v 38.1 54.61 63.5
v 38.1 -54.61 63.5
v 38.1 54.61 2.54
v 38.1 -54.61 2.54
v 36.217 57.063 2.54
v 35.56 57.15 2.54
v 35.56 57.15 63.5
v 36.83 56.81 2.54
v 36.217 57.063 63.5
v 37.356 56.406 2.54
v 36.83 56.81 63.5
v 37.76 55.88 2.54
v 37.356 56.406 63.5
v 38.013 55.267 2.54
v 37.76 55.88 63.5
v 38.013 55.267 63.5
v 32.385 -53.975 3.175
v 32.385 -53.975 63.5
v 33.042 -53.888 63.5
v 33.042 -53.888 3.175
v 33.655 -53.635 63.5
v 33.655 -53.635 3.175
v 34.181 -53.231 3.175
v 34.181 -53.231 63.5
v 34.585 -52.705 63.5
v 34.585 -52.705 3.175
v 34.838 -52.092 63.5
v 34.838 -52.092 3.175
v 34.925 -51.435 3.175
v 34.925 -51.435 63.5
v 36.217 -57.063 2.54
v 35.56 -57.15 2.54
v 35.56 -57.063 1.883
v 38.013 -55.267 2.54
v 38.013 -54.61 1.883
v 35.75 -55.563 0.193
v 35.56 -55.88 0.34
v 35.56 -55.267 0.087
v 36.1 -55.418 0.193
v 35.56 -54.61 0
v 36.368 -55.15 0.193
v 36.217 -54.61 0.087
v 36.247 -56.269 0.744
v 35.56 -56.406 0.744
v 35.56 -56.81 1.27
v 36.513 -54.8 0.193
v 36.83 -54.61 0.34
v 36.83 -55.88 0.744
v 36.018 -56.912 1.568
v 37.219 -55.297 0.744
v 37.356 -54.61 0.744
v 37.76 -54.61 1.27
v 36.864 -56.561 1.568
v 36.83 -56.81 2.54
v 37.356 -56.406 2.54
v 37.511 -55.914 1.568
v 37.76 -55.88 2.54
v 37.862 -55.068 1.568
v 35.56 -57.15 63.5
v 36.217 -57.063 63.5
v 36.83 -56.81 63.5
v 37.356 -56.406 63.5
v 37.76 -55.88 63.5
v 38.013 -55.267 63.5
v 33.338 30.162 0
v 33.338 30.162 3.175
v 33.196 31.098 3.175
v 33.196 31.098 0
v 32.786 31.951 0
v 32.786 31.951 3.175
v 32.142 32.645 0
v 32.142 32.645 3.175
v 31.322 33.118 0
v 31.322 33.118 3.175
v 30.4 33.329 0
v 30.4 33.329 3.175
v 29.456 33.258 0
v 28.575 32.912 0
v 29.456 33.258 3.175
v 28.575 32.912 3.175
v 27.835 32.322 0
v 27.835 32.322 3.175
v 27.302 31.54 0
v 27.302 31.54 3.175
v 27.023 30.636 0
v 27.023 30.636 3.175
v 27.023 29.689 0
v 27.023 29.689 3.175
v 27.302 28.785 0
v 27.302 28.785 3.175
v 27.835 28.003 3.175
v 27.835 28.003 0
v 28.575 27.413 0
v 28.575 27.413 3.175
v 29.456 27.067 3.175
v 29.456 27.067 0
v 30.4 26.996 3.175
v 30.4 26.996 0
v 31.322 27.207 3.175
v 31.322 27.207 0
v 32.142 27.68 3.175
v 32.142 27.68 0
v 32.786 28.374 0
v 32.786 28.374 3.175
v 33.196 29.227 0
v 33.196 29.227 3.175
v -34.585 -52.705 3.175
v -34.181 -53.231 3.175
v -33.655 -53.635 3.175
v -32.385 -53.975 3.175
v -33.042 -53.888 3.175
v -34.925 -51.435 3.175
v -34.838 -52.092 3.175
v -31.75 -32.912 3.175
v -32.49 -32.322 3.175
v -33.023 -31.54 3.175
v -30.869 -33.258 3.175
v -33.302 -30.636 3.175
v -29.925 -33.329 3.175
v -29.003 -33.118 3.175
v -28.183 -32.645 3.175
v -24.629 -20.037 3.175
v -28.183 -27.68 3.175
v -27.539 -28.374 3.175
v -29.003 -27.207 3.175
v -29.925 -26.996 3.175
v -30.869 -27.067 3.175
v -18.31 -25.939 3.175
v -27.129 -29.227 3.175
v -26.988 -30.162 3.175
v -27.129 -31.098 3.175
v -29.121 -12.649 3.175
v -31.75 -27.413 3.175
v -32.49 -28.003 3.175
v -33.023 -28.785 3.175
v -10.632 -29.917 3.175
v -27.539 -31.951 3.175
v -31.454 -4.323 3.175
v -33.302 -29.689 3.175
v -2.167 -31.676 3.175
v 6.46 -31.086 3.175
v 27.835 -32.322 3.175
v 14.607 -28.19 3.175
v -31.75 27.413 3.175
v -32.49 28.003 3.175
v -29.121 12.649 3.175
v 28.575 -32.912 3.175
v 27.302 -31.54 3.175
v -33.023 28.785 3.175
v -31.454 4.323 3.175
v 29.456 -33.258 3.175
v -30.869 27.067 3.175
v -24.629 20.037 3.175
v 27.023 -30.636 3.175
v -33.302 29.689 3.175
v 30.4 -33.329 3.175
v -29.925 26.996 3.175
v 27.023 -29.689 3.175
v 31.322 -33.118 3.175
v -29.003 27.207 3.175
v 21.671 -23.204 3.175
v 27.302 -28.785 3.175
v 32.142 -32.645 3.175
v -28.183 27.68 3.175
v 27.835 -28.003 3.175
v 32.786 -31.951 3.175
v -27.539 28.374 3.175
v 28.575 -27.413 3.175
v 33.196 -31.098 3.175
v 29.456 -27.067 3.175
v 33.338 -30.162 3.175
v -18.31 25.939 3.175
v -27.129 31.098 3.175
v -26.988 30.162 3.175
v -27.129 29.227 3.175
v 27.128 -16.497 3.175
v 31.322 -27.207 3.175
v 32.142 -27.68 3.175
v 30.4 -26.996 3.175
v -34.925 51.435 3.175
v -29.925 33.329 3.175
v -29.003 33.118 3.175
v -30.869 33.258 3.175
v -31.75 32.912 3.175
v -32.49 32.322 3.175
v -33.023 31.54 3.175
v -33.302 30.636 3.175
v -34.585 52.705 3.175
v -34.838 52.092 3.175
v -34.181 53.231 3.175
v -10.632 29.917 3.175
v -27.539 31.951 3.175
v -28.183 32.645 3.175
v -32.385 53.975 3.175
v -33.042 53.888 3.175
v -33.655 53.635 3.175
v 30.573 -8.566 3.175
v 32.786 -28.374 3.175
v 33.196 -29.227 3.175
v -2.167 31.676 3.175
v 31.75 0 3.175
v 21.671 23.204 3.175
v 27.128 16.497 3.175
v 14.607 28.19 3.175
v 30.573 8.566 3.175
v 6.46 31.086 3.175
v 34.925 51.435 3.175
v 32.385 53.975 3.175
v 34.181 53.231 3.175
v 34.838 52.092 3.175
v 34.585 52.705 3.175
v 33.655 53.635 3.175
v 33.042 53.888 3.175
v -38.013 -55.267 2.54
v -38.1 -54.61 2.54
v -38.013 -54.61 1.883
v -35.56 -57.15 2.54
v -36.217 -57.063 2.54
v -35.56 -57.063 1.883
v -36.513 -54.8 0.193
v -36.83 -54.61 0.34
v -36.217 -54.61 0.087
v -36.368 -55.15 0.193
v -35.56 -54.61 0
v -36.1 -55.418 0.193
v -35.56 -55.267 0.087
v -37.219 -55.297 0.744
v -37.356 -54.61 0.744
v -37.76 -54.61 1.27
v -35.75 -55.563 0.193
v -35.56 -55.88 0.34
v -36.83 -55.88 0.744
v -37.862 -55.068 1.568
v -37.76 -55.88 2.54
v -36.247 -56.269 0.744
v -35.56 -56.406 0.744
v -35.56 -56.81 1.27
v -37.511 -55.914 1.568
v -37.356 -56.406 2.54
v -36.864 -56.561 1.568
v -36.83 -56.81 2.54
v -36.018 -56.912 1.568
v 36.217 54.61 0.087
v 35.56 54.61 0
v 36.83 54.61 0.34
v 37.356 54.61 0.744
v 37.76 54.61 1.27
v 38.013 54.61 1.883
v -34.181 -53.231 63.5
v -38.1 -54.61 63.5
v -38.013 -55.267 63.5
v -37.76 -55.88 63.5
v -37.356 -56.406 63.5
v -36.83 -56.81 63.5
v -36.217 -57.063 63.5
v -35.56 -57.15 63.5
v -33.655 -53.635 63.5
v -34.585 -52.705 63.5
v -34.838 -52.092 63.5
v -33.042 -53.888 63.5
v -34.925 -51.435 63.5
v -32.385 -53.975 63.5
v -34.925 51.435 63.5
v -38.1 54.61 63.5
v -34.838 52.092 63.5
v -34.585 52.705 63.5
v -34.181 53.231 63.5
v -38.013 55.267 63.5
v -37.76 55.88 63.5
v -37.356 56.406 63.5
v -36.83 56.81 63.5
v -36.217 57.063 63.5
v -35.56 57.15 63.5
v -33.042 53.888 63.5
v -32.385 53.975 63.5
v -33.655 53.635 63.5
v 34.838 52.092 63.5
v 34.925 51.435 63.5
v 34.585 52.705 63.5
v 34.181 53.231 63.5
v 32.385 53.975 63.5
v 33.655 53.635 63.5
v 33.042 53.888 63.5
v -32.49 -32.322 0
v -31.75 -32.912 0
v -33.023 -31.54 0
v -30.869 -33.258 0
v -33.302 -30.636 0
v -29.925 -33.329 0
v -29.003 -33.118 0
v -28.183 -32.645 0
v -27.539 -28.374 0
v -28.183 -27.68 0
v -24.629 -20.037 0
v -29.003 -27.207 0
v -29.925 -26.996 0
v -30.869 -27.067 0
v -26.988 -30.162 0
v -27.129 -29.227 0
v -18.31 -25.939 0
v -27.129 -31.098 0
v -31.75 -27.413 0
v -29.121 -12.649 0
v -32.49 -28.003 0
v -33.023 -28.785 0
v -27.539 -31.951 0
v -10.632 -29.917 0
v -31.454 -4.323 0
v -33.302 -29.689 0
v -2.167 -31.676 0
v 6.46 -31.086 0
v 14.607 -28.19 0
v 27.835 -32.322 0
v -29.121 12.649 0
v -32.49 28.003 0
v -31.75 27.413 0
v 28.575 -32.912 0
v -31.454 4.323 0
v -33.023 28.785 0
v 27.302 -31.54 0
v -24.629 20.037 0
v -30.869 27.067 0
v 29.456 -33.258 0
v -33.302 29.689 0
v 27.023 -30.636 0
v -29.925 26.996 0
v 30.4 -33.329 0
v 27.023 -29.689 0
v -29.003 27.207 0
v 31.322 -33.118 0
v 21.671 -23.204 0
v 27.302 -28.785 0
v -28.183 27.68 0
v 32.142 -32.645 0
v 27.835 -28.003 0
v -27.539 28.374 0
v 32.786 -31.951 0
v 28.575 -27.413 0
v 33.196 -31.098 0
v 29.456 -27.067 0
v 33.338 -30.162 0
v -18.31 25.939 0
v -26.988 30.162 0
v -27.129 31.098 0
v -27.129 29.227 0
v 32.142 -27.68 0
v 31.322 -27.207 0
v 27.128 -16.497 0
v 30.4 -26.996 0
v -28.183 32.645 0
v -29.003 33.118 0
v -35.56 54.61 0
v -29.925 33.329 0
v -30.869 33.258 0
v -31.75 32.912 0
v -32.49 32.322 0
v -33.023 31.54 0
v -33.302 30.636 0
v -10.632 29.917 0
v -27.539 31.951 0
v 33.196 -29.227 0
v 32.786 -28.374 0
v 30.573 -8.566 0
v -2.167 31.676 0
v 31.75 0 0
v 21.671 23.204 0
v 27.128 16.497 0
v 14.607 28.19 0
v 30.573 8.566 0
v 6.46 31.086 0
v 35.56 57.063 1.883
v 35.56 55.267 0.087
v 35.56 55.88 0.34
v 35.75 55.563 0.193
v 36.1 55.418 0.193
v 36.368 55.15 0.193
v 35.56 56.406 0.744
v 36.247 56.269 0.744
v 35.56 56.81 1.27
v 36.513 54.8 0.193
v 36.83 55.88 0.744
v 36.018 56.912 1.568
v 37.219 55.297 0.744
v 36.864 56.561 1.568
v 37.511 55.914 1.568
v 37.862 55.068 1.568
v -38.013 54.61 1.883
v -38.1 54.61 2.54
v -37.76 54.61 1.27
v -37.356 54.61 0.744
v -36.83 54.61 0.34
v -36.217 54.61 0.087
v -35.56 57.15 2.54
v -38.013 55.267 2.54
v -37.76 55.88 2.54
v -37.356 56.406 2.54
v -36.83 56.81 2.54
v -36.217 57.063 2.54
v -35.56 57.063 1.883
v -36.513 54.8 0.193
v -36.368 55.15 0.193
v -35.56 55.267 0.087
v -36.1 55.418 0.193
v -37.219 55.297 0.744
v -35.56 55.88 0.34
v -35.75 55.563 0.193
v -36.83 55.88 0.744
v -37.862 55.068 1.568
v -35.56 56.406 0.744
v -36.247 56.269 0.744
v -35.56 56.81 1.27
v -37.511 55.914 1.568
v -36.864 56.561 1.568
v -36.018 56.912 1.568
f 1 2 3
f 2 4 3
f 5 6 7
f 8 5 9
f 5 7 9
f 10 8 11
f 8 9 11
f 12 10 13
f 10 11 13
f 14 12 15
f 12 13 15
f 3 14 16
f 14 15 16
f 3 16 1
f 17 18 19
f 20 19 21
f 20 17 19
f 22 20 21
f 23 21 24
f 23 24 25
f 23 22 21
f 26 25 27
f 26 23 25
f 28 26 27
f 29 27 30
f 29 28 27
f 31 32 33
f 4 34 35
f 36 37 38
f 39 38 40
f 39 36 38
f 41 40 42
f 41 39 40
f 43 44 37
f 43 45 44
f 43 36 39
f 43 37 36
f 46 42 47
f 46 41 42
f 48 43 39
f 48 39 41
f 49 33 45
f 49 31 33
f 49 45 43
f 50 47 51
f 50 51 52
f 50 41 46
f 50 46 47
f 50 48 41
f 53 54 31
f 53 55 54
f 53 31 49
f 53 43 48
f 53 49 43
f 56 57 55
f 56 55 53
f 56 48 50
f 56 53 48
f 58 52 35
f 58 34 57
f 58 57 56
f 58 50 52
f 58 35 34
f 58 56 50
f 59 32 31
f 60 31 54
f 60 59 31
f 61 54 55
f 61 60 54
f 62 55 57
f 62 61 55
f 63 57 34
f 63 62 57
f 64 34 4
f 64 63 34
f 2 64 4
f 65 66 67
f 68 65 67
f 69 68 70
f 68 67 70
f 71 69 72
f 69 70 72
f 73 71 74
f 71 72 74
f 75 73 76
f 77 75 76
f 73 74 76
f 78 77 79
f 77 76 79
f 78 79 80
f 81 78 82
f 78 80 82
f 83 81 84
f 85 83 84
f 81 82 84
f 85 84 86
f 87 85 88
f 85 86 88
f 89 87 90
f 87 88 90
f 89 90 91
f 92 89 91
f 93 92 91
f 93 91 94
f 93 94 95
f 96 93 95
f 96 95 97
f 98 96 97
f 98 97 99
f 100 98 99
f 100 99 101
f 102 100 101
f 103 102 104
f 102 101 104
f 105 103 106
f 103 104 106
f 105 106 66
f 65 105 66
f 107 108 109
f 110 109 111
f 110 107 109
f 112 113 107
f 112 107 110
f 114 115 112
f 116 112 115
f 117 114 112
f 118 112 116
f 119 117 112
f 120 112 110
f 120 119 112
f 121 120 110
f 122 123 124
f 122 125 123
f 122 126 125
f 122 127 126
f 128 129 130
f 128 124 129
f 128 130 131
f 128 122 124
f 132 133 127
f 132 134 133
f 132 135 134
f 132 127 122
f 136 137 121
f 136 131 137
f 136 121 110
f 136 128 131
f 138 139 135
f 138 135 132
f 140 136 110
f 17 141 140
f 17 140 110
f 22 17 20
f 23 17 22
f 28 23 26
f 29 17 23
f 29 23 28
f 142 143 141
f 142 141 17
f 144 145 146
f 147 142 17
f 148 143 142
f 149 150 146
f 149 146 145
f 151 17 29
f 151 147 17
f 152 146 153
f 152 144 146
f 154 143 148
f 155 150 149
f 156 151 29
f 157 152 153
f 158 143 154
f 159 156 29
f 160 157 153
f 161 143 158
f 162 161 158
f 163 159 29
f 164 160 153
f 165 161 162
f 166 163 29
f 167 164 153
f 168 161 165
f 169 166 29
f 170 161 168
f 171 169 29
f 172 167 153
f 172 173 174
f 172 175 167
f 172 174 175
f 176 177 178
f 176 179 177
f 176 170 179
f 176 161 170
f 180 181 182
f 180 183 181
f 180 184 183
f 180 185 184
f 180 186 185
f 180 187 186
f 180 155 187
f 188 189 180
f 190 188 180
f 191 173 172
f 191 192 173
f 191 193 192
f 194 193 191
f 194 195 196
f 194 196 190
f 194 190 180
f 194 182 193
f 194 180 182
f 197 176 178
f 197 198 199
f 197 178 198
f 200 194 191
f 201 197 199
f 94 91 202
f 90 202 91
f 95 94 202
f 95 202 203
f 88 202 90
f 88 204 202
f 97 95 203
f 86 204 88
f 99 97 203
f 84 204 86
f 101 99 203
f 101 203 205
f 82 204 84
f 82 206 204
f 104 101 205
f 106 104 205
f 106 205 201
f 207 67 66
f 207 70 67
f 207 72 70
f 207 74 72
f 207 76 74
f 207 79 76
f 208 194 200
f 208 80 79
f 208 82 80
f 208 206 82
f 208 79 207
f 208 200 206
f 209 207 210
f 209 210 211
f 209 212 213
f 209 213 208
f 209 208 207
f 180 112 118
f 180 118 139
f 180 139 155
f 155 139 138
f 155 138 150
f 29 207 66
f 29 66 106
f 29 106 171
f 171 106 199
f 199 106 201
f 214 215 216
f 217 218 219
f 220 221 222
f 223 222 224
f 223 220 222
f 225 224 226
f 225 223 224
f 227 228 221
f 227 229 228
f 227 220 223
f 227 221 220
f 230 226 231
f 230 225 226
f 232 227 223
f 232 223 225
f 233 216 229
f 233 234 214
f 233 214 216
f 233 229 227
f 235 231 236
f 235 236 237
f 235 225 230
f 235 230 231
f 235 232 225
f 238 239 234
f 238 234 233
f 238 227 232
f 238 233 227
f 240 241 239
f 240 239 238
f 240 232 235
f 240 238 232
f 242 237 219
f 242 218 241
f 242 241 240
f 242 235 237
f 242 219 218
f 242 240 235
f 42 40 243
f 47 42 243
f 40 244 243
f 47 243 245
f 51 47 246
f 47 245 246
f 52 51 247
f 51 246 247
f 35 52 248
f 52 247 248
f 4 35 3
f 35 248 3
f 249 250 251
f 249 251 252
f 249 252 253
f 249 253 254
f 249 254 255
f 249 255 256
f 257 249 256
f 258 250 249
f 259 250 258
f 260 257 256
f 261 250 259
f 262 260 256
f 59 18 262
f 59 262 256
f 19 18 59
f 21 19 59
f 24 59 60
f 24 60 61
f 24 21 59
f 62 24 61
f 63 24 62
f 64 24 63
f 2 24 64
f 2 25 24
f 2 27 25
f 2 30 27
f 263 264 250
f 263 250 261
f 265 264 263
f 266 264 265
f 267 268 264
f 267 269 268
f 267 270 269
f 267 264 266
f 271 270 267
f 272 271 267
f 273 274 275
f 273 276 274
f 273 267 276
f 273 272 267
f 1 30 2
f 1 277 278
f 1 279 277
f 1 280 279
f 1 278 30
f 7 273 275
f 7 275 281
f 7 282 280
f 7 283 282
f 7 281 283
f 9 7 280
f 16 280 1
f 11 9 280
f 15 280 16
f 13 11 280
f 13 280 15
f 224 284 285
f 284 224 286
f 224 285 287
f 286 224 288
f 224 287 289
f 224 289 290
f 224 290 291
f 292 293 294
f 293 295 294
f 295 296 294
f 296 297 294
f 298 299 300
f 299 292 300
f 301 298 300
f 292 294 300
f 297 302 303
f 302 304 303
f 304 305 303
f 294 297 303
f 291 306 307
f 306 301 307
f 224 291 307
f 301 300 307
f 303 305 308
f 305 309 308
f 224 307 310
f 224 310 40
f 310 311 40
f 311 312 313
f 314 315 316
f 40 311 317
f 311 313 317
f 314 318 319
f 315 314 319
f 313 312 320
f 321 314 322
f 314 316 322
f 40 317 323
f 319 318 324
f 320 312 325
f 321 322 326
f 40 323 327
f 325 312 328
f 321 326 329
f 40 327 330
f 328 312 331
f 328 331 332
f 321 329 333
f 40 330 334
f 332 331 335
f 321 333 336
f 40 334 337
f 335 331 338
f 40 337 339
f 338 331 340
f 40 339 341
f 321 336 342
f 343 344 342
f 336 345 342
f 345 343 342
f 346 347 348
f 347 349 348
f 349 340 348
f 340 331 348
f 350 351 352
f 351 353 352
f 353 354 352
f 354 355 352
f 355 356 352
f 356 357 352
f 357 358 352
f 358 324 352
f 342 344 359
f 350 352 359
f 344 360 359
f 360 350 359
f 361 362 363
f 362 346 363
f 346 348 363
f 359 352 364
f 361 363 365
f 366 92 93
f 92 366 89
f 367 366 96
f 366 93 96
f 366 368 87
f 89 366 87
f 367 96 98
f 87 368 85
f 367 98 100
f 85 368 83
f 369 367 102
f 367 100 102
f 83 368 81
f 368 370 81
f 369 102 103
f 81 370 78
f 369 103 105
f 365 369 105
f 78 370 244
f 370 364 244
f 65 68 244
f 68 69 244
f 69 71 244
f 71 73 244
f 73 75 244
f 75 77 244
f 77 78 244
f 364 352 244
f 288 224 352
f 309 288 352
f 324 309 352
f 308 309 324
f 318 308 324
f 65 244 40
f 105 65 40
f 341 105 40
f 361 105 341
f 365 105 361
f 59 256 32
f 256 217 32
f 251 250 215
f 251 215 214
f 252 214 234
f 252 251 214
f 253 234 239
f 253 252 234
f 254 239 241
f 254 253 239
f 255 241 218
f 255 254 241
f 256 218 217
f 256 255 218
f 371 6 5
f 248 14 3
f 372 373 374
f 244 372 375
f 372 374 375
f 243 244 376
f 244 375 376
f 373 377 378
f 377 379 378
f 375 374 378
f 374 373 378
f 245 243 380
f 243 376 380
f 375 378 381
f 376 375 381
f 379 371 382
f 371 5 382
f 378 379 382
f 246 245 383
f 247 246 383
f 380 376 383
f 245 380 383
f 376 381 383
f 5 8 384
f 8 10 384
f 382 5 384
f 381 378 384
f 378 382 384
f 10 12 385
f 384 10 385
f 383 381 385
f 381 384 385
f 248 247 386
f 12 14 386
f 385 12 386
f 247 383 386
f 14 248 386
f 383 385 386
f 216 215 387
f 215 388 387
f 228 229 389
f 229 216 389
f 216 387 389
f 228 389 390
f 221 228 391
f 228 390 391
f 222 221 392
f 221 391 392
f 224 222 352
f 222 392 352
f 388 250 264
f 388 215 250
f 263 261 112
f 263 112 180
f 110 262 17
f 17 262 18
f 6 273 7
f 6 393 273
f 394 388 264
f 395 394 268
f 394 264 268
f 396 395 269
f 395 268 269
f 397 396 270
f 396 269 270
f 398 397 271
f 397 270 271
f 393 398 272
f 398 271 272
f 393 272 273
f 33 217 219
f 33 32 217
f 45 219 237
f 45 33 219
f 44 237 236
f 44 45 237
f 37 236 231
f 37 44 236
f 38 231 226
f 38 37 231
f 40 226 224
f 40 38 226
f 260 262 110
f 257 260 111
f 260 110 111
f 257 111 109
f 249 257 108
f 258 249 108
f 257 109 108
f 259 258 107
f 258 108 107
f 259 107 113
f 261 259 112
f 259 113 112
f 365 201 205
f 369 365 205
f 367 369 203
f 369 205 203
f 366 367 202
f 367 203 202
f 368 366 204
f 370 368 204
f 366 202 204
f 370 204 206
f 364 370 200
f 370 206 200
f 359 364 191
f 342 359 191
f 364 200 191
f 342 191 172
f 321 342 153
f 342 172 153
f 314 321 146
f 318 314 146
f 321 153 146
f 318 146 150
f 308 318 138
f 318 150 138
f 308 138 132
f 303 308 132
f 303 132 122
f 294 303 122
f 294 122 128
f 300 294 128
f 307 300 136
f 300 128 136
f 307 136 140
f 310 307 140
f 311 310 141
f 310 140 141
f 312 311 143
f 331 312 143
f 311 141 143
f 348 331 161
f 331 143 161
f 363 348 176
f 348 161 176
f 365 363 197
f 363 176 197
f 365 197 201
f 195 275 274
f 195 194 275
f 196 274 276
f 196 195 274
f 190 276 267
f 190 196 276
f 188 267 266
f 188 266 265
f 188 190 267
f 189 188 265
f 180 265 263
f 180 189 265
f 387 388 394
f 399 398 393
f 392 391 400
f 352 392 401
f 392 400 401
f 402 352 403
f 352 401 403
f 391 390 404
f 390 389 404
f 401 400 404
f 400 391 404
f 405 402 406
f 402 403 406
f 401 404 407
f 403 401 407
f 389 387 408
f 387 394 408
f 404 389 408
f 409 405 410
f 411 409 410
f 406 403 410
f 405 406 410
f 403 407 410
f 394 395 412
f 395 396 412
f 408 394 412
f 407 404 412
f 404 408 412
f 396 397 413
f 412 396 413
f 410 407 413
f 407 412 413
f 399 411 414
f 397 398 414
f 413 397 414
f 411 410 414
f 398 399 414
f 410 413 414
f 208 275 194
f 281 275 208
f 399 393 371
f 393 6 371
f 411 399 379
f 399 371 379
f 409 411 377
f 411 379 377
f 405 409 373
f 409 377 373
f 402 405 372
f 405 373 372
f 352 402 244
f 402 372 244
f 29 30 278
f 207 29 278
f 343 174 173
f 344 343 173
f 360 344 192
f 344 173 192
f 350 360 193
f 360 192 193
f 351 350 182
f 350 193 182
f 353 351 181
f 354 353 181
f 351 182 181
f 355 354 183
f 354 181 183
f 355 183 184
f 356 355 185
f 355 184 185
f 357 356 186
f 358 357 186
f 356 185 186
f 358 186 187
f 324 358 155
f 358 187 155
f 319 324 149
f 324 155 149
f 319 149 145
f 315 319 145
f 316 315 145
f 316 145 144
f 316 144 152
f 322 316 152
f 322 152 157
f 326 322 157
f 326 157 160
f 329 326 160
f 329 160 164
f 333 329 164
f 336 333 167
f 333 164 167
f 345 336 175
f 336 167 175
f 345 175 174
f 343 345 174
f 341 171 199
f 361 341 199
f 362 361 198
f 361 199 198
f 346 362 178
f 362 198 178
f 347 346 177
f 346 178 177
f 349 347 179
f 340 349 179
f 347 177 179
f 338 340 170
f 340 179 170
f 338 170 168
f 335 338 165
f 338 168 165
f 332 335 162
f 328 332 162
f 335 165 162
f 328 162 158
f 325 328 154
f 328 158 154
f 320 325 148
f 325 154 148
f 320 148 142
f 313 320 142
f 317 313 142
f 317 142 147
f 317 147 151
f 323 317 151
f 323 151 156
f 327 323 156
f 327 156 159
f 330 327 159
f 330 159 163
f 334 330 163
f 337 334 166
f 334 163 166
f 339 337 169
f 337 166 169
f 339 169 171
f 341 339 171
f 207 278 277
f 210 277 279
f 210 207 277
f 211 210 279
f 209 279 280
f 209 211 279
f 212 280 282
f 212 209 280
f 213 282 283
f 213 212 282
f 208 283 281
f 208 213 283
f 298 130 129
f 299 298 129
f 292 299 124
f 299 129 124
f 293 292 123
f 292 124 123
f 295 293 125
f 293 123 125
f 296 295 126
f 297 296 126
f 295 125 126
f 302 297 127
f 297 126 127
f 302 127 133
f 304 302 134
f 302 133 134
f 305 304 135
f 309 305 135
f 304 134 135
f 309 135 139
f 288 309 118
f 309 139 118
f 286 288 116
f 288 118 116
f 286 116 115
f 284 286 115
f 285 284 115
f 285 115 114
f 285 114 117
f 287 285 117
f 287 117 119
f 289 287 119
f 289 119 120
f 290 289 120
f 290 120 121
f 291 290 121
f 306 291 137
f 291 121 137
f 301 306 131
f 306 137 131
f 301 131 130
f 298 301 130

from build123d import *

# Parameters (mm, degrees)
F0_W     = 76.2
F0_H     = 114.3
F1_DEPTH = 63.5
F2_W     = 69.85
F2_H     = 107.95
F3_DEPTH = 60.325
F4_R     = 2.54
F5_R     = 31.75
F6_DEPTH = 3.175
F7_R     = 3.175
F8_DEPTH = 3.175


with BuildPart() as f1:
    # F0 (on Top) → F1 (new body)
    with BuildSketch(Plane.XY):
        Rectangle(F0_W, F0_H)
    extrude(amount=F1_DEPTH)

    # F2 (on face) → F3 (cut)
    with BuildSketch(Plane.XY.offset(63.5)):
        Rectangle(F2_W, F2_H)
    extrude(amount=-F3_DEPTH, mode=Mode.SUBTRACT)

    # F4
    f4_edges = [f1.edges().sort_by_distance(p)[0] for p in [
        (34.925, 53.975, 33.3375),
        (34.925, -53.975, 33.3375),
        (-34.925, -53.975, 33.3375),
        (-34.925, 53.975, 33.3375),
        (38.1, -57.15, 31.75),
        (38.1, 57.15, 31.75),
        (-38.1, -57.15, 31.75),
        (-38.1, 57.15, 31.75),
        (-38.1, 0, 0),
        (0, 57.15, 0),
        (0, -57.15, 0),
        (38.1, 0, 0),
    ]]
    fillet(f4_edges, radius=F4_R)

    # F5 (on face) → F6 (cut, through all)
    with BuildSketch(Plane.XY.offset(3.175)):
        Circle(F5_R)
    extrude(amount=-F6_DEPTH, mode=Mode.SUBTRACT)

    # F7 (on face) → F8 (cut, through all)
    with BuildSketch(Plane.XY.offset(3.175)):
        with Locations((30.1625, 30.1625)):
            Circle(F7_R)
        with Locations((30.1625, -30.1625)):
            Circle(F7_R)
        with Locations((-30.1625, -30.1625)):
            Circle(F7_R)
        with Locations((-30.1625, 30.1625)):
            Circle(F7_R)
    extrude(amount=-F8_DEPTH, mode=Mode.SUBTRACT)


solid = f1.part
